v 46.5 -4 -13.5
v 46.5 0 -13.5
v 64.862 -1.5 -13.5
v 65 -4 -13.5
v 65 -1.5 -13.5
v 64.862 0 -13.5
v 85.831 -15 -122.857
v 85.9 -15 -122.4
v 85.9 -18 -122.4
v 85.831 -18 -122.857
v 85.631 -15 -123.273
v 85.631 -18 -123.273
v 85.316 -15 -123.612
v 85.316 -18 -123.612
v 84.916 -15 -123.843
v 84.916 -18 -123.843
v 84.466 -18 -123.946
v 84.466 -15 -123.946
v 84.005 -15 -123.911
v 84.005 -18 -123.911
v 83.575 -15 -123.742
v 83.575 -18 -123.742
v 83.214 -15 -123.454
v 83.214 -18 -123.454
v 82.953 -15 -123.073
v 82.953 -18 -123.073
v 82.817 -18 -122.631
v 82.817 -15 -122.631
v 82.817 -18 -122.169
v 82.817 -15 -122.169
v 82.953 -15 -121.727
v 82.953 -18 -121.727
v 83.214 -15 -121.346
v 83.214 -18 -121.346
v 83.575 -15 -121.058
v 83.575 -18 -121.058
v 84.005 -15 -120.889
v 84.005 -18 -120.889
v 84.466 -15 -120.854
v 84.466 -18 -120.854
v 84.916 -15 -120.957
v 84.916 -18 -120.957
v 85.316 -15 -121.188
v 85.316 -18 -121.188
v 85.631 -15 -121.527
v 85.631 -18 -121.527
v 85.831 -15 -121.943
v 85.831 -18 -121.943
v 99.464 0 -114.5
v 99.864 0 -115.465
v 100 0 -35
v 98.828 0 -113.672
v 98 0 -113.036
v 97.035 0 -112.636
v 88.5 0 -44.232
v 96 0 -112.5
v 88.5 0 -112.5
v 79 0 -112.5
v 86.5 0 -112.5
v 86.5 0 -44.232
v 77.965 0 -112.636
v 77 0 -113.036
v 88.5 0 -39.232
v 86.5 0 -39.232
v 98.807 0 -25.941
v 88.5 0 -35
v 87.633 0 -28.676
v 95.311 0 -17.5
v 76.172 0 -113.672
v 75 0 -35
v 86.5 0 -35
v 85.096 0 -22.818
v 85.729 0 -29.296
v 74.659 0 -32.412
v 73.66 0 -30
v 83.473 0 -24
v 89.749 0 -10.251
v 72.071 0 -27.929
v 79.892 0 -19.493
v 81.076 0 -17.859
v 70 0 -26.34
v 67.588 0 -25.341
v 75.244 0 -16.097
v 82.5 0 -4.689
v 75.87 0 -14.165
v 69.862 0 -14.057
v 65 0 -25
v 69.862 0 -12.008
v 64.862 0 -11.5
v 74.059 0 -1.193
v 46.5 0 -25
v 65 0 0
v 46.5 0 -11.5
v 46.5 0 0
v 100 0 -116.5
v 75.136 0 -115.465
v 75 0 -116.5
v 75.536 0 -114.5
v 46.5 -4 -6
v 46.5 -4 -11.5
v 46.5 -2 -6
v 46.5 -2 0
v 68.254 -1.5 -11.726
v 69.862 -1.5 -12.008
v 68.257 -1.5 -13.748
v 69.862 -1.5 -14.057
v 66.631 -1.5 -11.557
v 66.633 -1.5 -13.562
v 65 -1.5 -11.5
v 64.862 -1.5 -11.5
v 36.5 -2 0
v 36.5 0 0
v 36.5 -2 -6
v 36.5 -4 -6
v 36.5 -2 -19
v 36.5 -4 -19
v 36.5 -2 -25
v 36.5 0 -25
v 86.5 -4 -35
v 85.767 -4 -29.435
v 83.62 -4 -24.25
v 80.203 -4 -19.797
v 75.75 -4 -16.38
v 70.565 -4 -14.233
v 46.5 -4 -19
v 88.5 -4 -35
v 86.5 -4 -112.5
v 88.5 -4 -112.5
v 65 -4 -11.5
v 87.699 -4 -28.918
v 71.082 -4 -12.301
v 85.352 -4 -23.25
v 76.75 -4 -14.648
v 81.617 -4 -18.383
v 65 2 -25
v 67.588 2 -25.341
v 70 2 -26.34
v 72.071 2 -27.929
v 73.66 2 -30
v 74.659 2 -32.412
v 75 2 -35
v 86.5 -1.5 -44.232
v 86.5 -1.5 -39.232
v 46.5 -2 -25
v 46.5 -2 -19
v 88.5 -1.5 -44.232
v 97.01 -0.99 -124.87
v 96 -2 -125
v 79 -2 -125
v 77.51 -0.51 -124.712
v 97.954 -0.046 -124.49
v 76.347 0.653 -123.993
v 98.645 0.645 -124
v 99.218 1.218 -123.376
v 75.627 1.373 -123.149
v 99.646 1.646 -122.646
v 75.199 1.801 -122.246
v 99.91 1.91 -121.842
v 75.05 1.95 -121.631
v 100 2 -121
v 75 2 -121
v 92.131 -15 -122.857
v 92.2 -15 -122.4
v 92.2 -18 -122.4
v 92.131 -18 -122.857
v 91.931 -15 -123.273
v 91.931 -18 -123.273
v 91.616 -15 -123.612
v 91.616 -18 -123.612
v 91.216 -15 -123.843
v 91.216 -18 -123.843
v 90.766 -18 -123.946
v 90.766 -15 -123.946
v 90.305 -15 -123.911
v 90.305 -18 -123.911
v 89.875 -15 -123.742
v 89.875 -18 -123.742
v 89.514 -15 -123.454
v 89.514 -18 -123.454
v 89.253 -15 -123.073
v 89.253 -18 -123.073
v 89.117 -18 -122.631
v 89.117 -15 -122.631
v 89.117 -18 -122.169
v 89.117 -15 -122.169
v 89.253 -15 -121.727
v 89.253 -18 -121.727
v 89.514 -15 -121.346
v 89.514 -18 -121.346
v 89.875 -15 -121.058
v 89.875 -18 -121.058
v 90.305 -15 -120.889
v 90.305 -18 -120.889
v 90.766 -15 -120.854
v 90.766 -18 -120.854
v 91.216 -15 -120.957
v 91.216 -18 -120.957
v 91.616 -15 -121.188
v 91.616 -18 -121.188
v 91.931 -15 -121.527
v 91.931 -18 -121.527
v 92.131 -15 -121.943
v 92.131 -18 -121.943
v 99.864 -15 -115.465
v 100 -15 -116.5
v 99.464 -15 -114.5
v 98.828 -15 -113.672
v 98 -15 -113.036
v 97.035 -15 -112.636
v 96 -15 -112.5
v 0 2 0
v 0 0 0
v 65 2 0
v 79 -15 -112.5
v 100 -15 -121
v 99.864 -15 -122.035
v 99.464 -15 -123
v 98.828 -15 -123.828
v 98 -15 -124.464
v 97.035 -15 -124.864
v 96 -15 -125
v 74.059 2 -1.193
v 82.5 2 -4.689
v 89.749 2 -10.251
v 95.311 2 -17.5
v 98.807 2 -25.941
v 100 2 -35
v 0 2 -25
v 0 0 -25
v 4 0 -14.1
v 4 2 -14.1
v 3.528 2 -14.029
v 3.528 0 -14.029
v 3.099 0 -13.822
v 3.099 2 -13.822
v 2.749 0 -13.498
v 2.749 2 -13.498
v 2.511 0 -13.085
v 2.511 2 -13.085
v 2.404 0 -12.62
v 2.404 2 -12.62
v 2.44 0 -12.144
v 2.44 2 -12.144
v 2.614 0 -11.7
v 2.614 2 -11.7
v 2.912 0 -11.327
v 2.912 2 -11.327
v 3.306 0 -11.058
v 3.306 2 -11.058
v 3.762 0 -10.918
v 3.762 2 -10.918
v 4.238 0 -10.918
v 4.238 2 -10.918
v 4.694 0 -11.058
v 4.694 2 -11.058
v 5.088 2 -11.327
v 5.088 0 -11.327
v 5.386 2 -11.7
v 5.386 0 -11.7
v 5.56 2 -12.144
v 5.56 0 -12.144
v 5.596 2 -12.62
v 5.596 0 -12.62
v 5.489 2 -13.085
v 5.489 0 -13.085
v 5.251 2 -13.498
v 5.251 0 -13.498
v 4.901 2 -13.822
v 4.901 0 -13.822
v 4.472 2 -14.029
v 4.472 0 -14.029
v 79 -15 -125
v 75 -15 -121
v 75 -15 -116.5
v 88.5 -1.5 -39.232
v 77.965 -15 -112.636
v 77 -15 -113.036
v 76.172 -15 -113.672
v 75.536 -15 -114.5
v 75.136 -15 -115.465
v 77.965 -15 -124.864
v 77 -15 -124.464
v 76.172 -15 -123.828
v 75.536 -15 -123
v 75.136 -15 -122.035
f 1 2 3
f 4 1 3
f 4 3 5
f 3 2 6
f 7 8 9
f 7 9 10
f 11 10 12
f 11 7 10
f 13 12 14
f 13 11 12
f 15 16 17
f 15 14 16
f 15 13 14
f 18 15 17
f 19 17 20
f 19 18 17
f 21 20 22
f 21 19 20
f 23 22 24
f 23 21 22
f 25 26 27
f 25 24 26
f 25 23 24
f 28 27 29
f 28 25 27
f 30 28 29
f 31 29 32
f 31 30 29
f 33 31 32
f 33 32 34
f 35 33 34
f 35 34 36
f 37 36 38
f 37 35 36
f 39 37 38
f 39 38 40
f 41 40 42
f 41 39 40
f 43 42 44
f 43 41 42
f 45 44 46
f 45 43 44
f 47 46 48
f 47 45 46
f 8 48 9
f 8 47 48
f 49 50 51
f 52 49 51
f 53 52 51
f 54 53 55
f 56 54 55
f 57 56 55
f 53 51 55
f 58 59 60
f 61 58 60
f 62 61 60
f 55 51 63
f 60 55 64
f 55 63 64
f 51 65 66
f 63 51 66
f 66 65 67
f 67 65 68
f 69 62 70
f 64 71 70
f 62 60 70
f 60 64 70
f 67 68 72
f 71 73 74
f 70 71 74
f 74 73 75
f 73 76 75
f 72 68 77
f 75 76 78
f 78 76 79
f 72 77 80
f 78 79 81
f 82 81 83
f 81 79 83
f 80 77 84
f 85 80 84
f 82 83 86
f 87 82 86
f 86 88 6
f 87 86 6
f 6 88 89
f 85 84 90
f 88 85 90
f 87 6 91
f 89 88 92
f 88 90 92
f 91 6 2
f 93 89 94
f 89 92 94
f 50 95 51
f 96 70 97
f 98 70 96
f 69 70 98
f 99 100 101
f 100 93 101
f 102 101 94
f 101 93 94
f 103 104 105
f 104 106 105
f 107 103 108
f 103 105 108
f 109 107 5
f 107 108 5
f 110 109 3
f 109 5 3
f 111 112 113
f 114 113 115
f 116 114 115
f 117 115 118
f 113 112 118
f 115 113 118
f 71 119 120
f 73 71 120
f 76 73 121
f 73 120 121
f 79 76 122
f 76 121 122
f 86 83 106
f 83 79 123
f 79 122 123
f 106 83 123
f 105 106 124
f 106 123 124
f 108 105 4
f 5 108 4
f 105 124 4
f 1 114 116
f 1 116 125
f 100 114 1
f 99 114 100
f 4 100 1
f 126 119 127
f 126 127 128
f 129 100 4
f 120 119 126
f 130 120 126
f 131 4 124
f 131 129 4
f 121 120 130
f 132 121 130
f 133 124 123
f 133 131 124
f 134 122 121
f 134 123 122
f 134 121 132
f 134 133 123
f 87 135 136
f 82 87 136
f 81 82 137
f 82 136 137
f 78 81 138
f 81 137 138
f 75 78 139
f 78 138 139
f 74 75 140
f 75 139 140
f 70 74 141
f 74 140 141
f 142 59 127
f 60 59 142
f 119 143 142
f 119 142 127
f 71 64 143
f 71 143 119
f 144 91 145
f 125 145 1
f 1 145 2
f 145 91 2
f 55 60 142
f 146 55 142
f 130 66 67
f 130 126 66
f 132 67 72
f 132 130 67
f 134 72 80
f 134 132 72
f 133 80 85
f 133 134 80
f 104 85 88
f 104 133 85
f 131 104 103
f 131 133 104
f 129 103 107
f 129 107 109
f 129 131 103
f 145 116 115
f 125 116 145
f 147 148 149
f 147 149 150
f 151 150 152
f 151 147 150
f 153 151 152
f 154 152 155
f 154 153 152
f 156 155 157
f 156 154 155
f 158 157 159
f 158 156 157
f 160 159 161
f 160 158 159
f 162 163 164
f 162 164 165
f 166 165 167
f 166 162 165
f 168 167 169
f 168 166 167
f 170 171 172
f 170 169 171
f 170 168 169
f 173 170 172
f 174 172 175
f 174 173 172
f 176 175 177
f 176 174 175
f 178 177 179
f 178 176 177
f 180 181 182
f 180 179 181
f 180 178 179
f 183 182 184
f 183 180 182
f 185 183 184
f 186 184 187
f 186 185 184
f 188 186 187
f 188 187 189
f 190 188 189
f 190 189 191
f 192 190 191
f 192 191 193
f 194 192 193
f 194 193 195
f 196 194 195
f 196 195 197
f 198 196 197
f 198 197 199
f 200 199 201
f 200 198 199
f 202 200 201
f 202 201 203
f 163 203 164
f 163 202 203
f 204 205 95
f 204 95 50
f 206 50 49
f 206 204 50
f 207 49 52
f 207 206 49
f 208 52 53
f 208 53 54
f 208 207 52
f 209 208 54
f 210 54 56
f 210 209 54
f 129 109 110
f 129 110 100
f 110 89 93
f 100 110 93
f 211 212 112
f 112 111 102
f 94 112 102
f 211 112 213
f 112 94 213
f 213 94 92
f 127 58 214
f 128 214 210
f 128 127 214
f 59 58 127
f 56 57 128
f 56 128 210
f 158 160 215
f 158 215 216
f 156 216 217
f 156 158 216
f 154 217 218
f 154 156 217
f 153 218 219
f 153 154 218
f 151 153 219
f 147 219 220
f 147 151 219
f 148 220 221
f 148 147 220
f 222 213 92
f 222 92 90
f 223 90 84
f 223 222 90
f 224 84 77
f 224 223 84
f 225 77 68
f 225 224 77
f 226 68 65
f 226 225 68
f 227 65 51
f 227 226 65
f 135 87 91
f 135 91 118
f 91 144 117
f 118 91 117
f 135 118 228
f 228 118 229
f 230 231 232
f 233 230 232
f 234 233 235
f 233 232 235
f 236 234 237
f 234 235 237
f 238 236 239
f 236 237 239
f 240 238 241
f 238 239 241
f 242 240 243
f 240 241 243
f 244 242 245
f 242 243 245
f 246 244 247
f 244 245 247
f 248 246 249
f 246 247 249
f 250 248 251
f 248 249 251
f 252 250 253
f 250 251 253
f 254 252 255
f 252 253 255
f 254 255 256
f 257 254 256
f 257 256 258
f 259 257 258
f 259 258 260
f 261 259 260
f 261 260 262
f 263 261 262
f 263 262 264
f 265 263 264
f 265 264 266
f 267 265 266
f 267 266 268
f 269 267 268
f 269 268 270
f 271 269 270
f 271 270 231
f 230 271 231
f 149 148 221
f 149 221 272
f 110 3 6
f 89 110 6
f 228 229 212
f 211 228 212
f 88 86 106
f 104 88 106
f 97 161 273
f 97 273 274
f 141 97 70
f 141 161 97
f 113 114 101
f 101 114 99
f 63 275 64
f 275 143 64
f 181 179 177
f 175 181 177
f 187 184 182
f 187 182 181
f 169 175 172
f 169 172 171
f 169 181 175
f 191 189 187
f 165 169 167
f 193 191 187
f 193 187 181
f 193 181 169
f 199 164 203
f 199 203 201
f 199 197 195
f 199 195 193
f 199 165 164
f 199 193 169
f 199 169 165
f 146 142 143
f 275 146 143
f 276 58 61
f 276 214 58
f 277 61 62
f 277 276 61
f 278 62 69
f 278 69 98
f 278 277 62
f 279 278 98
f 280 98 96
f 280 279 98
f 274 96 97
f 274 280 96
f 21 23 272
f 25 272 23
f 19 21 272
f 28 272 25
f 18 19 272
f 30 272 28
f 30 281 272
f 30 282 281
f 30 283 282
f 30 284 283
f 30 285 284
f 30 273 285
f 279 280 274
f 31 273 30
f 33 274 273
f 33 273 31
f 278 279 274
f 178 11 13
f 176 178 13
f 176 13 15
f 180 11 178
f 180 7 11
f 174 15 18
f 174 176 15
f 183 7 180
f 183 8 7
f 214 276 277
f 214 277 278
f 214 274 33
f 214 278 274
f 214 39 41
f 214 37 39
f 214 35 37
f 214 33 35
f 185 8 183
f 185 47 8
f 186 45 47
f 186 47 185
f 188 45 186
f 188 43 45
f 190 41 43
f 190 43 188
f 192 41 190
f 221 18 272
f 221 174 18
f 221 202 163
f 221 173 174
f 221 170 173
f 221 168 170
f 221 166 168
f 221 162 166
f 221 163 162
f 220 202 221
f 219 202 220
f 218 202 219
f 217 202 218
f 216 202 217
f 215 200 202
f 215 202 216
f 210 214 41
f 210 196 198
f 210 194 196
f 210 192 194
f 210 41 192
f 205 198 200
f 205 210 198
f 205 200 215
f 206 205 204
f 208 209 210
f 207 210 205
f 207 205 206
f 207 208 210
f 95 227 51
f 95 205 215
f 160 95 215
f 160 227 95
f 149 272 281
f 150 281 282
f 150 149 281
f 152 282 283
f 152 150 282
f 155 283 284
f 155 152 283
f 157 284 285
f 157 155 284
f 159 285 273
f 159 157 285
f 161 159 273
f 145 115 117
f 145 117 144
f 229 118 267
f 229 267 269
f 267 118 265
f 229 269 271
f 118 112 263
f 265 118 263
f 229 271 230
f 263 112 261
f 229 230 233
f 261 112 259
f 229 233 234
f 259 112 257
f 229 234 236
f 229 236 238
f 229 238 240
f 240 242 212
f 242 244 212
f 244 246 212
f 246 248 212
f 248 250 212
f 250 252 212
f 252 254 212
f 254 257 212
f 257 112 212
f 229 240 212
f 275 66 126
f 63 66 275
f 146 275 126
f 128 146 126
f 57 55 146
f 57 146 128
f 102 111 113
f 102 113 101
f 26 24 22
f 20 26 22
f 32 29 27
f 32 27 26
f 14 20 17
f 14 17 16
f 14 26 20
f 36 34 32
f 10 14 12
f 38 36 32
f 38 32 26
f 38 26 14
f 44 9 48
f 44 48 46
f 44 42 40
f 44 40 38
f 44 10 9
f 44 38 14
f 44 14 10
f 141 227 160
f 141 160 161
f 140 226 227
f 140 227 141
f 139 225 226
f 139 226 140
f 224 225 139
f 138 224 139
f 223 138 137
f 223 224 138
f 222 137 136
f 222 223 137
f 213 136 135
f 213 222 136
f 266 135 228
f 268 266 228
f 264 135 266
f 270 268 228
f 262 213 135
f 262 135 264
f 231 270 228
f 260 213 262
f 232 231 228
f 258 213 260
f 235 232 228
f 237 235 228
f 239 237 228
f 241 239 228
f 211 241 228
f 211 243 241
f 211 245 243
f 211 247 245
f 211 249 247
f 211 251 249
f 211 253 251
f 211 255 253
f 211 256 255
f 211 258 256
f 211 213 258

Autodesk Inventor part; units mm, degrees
ref_plane "YZ Plane" through (0, 0, 0) normal (1, 0, 0) x (0, 1, 0)
ref_plane "XZ Plane" through (0, 0, 0) normal (0, 1, 0) x (-1, 0, 0)
ref_plane "XY Plane" through (0, 0, 0) normal (0, 0, 1) x (1, 0, 0)
sketch "Sketch1" plane through (0, 0, 0) normal (0, 1, 0) x (-1, 0, 0)
  line L0 (0, 0) -> (-100, 0)
  line L1 (-100, 0) -> (-100, -25)
  line L2 (-100, -25) -> (0, -25)
  line L3 (0, -25) -> (0, 0)
  line L4 (-100, -25) -> (-75, -25)
  line L5 (-75, -25) -> (-75, -125)
  line L6 (-75, -125) -> (-100, -125)
  line L7 (-100, -125) -> (-100, -25)
  dimension "d0" = 100
  dimension "d1" = 25
  dimension "d2" = 25
  dimension "d3" = 100
extrude "Extrusion1" add sketch "Sketch1" along normal blind 2
sketch "Sketch2" plane through (0, 0, 0) normal (0, -1, 0) x (1, 0, 0)
  line L0 (100, 0) -> (100, -125) projected
  line L1 (75, -125) -> (75, -25) projected
  line L2 (100, -125) -> (75, -125)
  line L3 (75, -125) -> (75, -112.5)
  line L4 (75, -112.5) -> (100, -112.5)
  line L5 (100, -112.5) -> (100, -125)
  line L6 (88.5, -112.5) -> (86.5, -112.5)
  line L7 (86.5, -112.5) -> (86.5, -11.5)
  line L8 (86.5, -11.5) -> (88.5, -11.5)
  line L9 (88.5, -11.5) -> (88.5, -112.5)
  line L10 (86.5, -11.5) -> (46.5, -11.5)
  line L11 (46.5, -11.5) -> (46.5, -13.5)
  line L12 (46.5, -13.5) -> (86.5, -13.5)
  line L13 (86.5, -13.5) -> (86.5, -11.5)
  line L14 (0, 0) -> (100, 0) projected
  line L15 (75, -25) -> (0, -25) projected
  line L16 (46.5, 0) -> (36.5, 0)
  line L17 (36.5, 0) -> (36.5, -25)
  line L18 (36.5, -25) -> (46.5, -25)
  line L19 (46.5, -25) -> (46.5, 0)
  dimension "d6" = 12.5
  dimension "d7" = 101
  dimension "d8" = 2
  dimension "d9" = 11.5
  dimension "d10" = 40
  dimension "d11" = 2
  dimension "d12" = 10
extrude "Extrusion2" add sketch "Sketch2" along normal blind 4 contours L19 L11 L15 L17 L14 | L4 L7 L8 L9 | L10 L7 L12 L11
extrude "Extrusion3" add sketch "Sketch2" along normal blind 15 contours L0 L2 L1 L4
sketch "Sketch3" plane through (0, -15, 0) normal (0, -1, 0) x (1, 0, 0)
  circle A0 centre (90.65, -122.4) radius 1.55
  circle A1 centre (84.35, -122.4) radius 1.55
  line L0 (75, -125) -> (100, -125) projected
  line L1 (75, -112.5) -> (75, -125) projected
  point P0 (0, 0)
  dimension "d17" = 3.1
  dimension "d18" = 3.1
  dimension "d19" = 2.6
  dimension "d20" = 2.6
  dimension "d21" = 6.3
  dimension "d22" = 9.35
extrude "Extrusion4" add sketch "Sketch3" along normal blind 3
sketch "Sketch4" plane through (0, -4, 0) normal (0, -1, 0) x (1, 0, 0)
  line L0 (46.5, -11.5) -> (46.5, 0) projected
  line L1 (36.5, -25) -> (36.5, 0) projected
  line L2 (46.5, 0) -> (36.5, 0)
  line L3 (36.5, 0) -> (36.5, -6)
  line L4 (36.5, -6) -> (46.5, -6)
  line L5 (46.5, -6) -> (46.5, 0)
  line L6 (46.5, -13.5) -> (46.5, -25) projected
  line L7 (46.5, -25) -> (36.5, -25)
  line L8 (36.5, -25) -> (36.5, -19)
  line L9 (36.5, -19) -> (46.5, -19)
  line L10 (46.5, -19) -> (46.5, -25)
  point P0 (0, 0)
  point P1 (41.5, 0)
  dimension "d25" = 6
  dimension "d26" = 6
extrude "Extrusion5" cut sketch "Sketch4" against normal blind 2
sketch "Sketch5" plane through (86.5, -4, -13.5) normal (-1, 0, 0) x (0, 0, 1)
  line L0 (-99, 4) -> (-11.5, 4) projected
  line L1 (-25.7317, 4) -> (-30.7317, 4)
  line L2 (-30.7317, 4) -> (-30.7317, 2.5)
  line L3 (-30.7317, 2.5) -> (-25.7317, 2.5)
  line L4 (-25.7317, 2.5) -> (-25.7317, 4)
  point P0 (13.5, 4)
  dimension "d29" = 5
  dimension "d30" = 1.5
extrude "Extrusion6" cut sketch "Sketch5" against normal blind 2
sketch "Sketch6" plane through (86.5, 0, -13.5) normal (0, 0, -1) x (-1, 0, 0)
  line L0 (11.5, 0) -> (40, 0) projected
  line L1 (21.6385, 0) -> (16.6385, 0)
  line L2 (16.6385, 0) -> (16.6385, -1.5)
  line L3 (16.6385, -1.5) -> (21.6385, -1.5)
  line L4 (21.6385, -1.5) -> (21.6385, 0)
  point P0 (86.5, 0)
  point P1 (16.6385, 0)
  dimension "d33" = 5
  dimension "d34" = 1.5
extrude "Extrusion7" cut sketch "Sketch6" against normal blind 2
fillet "Fillet1" radius 4 5 edges at (100, -6.5, -125) (100, -7.5, -112.5) (75, -6.5, -125) (75, -7.5, -112.5) (87.5, 2, -125)
fillet "Fillet2" radius 35 1 edges at (100, 1, 0)
fillet "Fillet2" radius 10 1 edges at (75, 1, -25)
fillet "Fillet2" radius 23.5 1 edges at (88.5, -2, -11.5)
fillet "Fillet2" radius 21.5 1 edges at (86.5, -2, -13.5)
sketch "Sketch7" plane through (0, 0, 0) normal (0, -1, 0) x (1, 0, 0)
  line L0 (0, -25) -> (0, 0) projected
  line L1 (36.5, -25) -> (0, -25) projected
  point P0 (4, -12.5)
  dimension "d42" = 4
  dimension "d43" = 12.5
hole "Hole1" at (4, 0, -12.5) direction (0, 1, 0) diameter 3.2 end through all
equation "\"d20\" = d19"
properties part number "mlx_holder"
